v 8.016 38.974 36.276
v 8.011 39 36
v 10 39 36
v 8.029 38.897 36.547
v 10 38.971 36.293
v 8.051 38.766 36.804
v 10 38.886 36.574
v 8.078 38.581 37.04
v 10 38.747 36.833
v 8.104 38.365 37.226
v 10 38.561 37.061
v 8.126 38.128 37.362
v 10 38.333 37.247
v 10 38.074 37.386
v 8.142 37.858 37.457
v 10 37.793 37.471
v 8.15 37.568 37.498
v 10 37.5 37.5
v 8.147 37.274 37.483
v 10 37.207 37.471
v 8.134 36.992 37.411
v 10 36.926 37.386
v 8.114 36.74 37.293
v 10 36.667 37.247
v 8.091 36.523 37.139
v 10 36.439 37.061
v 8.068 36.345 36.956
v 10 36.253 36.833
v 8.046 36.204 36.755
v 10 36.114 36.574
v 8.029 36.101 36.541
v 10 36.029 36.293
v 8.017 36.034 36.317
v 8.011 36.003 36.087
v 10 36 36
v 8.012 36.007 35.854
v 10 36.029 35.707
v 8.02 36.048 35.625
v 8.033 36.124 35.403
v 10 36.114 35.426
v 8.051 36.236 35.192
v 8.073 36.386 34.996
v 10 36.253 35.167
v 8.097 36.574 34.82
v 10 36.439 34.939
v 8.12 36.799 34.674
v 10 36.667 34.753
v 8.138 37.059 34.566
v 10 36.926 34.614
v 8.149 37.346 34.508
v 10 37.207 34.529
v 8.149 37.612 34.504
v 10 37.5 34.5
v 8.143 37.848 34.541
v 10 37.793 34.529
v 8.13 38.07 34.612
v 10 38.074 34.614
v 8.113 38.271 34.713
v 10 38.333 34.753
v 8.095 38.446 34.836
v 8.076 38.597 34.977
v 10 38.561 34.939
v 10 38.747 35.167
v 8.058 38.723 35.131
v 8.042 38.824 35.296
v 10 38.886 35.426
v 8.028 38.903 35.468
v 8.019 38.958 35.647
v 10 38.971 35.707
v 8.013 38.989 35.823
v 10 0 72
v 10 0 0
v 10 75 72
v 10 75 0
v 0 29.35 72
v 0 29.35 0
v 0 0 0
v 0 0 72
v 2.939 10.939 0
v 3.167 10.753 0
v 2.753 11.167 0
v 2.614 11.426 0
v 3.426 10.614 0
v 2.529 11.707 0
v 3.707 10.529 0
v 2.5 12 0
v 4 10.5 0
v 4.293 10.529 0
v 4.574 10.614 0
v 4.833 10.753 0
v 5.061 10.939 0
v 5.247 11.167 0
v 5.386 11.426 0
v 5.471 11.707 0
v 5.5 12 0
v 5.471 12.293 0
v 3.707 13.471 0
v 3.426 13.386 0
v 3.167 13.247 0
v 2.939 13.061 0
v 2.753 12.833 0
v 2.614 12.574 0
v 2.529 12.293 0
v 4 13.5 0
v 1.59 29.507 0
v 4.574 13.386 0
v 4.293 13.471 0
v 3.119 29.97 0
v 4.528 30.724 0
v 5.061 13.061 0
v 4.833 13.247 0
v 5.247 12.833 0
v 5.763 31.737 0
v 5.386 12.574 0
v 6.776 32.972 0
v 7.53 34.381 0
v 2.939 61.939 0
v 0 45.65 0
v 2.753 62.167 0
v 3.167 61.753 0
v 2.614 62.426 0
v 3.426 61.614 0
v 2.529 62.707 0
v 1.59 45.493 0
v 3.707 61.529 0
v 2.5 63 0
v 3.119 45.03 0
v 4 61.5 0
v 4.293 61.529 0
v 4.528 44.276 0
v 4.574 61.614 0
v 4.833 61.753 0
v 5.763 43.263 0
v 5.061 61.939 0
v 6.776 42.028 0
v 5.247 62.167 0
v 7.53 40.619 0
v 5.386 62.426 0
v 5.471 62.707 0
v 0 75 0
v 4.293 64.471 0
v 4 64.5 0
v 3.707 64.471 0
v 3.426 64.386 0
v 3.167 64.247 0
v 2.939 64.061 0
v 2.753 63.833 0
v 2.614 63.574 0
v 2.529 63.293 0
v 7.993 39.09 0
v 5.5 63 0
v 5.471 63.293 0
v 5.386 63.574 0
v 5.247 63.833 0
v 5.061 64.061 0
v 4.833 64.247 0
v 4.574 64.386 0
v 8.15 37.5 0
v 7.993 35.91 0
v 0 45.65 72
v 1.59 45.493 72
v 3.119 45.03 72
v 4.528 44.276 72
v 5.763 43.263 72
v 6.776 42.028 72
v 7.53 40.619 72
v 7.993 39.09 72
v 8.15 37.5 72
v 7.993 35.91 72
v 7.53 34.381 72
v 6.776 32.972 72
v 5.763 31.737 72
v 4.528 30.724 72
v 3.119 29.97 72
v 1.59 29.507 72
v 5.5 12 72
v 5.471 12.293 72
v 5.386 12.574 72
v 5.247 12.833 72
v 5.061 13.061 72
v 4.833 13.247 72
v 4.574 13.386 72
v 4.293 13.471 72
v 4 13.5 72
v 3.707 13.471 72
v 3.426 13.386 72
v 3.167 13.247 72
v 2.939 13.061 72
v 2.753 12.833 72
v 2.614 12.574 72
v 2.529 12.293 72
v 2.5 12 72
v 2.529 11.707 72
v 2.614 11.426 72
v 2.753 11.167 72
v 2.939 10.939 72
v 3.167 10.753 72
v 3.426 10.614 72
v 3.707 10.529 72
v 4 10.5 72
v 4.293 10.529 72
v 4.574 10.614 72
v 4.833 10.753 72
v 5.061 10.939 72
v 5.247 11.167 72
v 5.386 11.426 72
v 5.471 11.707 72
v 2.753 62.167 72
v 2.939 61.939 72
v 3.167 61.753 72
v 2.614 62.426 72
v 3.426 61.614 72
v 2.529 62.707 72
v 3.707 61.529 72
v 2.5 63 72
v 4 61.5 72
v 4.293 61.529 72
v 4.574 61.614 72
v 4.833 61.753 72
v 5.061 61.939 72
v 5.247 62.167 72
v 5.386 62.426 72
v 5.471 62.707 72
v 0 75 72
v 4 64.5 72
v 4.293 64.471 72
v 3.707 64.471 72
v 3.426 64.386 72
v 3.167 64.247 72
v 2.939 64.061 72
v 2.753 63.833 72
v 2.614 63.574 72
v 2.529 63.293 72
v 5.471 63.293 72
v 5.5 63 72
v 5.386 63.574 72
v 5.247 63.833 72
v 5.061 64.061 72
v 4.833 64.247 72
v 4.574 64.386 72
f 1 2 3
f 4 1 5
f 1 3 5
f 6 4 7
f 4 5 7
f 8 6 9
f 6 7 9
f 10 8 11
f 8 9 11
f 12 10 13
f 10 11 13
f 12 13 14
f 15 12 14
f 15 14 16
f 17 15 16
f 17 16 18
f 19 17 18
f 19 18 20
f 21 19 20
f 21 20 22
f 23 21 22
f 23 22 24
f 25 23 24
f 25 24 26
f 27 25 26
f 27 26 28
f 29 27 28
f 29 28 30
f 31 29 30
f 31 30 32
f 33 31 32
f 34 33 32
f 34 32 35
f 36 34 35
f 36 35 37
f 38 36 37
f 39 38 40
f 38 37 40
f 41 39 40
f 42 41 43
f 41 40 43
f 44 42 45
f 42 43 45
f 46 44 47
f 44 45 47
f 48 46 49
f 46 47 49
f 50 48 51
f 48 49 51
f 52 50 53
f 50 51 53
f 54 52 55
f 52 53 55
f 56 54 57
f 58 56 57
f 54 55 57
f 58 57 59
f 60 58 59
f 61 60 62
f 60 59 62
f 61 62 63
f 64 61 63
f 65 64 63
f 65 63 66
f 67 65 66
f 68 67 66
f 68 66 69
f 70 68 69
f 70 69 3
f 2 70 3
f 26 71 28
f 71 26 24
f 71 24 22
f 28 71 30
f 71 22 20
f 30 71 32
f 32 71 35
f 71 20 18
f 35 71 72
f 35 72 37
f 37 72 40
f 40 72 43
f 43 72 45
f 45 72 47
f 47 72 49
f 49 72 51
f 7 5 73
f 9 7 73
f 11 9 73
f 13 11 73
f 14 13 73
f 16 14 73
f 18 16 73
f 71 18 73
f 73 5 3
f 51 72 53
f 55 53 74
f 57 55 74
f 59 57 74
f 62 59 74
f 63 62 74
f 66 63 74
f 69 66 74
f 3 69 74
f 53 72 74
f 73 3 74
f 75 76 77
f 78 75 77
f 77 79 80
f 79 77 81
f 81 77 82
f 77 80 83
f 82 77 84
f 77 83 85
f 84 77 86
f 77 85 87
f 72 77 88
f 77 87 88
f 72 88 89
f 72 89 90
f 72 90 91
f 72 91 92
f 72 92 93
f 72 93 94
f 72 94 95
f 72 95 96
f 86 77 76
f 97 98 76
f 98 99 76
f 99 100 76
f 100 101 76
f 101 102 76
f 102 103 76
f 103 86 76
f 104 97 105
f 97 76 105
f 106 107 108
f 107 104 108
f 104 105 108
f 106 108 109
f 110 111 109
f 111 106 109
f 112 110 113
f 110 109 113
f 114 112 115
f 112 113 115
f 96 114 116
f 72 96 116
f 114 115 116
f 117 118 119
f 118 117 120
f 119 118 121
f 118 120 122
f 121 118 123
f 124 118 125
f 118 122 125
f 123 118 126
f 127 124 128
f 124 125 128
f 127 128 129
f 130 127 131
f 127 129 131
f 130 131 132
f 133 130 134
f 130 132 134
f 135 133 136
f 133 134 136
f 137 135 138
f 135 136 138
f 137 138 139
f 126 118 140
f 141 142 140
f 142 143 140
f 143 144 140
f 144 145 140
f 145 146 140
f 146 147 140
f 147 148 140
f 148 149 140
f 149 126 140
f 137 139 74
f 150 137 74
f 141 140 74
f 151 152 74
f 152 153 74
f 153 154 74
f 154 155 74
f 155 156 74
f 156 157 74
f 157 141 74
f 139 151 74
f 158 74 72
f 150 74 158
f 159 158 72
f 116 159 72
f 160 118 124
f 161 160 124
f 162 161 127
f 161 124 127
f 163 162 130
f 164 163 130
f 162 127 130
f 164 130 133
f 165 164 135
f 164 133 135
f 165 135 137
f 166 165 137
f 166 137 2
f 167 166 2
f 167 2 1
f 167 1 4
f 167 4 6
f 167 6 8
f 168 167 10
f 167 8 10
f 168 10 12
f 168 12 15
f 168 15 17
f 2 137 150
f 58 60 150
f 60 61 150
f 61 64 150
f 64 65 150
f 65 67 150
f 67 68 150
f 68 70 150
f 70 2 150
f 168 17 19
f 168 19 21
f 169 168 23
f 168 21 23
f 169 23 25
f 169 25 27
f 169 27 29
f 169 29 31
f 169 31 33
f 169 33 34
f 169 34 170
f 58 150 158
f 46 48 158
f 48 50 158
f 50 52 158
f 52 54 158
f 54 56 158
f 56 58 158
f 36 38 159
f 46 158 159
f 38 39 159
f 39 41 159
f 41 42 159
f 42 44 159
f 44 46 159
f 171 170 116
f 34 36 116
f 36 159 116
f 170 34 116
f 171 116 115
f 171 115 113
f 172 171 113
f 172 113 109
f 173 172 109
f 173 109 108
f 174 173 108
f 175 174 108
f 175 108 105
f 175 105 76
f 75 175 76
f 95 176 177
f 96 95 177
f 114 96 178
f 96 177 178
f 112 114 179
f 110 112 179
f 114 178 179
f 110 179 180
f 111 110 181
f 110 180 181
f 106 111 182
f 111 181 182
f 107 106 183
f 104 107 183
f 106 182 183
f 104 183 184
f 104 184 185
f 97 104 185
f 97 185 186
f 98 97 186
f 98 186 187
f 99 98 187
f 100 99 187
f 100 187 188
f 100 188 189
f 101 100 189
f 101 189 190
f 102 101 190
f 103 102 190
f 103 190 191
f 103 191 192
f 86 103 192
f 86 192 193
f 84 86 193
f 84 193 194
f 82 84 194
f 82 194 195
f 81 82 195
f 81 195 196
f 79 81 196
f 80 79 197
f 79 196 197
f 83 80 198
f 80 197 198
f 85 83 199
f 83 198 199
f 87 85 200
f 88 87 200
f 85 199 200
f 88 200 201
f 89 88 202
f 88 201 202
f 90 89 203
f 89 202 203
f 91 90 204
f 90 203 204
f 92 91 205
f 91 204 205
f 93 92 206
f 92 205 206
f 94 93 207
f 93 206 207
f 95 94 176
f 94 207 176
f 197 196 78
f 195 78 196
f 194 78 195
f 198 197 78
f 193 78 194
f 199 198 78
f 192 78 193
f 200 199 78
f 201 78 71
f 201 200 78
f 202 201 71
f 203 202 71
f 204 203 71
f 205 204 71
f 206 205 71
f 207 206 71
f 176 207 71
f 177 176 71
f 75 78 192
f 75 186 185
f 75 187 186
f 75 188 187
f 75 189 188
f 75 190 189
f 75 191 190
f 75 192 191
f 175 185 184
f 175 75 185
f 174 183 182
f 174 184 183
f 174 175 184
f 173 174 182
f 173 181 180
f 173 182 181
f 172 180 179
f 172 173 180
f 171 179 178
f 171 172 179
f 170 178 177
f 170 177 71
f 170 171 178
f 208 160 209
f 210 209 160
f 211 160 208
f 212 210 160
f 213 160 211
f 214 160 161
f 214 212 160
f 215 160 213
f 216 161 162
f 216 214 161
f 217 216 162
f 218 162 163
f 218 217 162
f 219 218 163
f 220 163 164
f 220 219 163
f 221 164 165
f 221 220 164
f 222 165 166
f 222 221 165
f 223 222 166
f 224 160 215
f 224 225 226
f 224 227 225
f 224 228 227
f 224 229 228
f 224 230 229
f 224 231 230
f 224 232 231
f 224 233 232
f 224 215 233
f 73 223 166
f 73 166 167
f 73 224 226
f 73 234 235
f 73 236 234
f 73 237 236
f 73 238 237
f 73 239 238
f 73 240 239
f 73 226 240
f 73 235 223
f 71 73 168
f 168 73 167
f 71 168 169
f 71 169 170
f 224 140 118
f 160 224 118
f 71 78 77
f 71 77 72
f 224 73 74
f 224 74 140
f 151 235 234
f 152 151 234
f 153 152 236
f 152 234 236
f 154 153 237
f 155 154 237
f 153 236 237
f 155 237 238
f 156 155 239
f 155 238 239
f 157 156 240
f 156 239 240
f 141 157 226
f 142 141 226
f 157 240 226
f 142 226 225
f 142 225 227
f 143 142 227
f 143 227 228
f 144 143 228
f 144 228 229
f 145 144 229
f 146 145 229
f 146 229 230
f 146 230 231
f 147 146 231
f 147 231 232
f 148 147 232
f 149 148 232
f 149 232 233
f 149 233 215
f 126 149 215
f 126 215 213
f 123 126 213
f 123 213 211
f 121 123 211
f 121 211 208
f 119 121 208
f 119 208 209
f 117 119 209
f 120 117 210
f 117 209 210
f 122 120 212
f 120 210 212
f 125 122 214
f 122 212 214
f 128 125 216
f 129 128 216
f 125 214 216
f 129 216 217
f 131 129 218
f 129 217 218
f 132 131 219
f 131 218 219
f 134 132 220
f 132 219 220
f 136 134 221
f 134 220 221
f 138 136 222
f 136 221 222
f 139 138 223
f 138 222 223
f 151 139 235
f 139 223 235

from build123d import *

# Parameters (mm, degrees)
SALIENTE_EXTRUIR1_DEPTH = 72
CROQUIS2_R              = 1.5
CORTAR_EXTRUIR1_DEPTH   = 73
CROQUIS3_R              = 1.5
CORTAR_EXTRUIR2_DEPTH   = 11


with BuildPart() as part:
    # Croquis1 → Saliente-Extruir1 (new body)
    with BuildSketch(Plane.XY):
        with BuildLine():
            Line((0, 0), (10, 0))
            Line((10, 0), (10, 75))
            Line((10, 75), (0, 75))
            Line((0, 75), (0, 45.65))
            ThreePointArc((0, 45.65), (8.15, 37.5), (0, 29.35))
            Line((0, 29.35), (0, 0))
        make_face()
    extrude(amount=SALIENTE_EXTRUIR1_DEPTH)

    # Croquis2 → Cortar-Extruir1 (cut, through all)
    with BuildSketch(Plane.XY.offset(72)):
        with Locations((4, 63)):
            Circle(CROQUIS2_R)
        with Locations((4, 12)):
            Circle(CROQUIS2_R)
    extrude(amount=-CORTAR_EXTRUIR1_DEPTH, mode=Mode.SUBTRACT)

    # Croquis3 → Cortar-Extruir2 (cut, through all)
    with BuildSketch(Plane(origin=(10, 0, 0), x_dir=(0, 0, -1), z_dir=(1, 0, 0))):
        with Locations(Location((-36, 37.5, 0), (0, 0, 90))):  # turned: the seam where the file's is
            Circle(CROQUIS3_R)
    extrude(amount=-CORTAR_EXTRUIR2_DEPTH, mode=Mode.SUBTRACT)


solid = part.part
